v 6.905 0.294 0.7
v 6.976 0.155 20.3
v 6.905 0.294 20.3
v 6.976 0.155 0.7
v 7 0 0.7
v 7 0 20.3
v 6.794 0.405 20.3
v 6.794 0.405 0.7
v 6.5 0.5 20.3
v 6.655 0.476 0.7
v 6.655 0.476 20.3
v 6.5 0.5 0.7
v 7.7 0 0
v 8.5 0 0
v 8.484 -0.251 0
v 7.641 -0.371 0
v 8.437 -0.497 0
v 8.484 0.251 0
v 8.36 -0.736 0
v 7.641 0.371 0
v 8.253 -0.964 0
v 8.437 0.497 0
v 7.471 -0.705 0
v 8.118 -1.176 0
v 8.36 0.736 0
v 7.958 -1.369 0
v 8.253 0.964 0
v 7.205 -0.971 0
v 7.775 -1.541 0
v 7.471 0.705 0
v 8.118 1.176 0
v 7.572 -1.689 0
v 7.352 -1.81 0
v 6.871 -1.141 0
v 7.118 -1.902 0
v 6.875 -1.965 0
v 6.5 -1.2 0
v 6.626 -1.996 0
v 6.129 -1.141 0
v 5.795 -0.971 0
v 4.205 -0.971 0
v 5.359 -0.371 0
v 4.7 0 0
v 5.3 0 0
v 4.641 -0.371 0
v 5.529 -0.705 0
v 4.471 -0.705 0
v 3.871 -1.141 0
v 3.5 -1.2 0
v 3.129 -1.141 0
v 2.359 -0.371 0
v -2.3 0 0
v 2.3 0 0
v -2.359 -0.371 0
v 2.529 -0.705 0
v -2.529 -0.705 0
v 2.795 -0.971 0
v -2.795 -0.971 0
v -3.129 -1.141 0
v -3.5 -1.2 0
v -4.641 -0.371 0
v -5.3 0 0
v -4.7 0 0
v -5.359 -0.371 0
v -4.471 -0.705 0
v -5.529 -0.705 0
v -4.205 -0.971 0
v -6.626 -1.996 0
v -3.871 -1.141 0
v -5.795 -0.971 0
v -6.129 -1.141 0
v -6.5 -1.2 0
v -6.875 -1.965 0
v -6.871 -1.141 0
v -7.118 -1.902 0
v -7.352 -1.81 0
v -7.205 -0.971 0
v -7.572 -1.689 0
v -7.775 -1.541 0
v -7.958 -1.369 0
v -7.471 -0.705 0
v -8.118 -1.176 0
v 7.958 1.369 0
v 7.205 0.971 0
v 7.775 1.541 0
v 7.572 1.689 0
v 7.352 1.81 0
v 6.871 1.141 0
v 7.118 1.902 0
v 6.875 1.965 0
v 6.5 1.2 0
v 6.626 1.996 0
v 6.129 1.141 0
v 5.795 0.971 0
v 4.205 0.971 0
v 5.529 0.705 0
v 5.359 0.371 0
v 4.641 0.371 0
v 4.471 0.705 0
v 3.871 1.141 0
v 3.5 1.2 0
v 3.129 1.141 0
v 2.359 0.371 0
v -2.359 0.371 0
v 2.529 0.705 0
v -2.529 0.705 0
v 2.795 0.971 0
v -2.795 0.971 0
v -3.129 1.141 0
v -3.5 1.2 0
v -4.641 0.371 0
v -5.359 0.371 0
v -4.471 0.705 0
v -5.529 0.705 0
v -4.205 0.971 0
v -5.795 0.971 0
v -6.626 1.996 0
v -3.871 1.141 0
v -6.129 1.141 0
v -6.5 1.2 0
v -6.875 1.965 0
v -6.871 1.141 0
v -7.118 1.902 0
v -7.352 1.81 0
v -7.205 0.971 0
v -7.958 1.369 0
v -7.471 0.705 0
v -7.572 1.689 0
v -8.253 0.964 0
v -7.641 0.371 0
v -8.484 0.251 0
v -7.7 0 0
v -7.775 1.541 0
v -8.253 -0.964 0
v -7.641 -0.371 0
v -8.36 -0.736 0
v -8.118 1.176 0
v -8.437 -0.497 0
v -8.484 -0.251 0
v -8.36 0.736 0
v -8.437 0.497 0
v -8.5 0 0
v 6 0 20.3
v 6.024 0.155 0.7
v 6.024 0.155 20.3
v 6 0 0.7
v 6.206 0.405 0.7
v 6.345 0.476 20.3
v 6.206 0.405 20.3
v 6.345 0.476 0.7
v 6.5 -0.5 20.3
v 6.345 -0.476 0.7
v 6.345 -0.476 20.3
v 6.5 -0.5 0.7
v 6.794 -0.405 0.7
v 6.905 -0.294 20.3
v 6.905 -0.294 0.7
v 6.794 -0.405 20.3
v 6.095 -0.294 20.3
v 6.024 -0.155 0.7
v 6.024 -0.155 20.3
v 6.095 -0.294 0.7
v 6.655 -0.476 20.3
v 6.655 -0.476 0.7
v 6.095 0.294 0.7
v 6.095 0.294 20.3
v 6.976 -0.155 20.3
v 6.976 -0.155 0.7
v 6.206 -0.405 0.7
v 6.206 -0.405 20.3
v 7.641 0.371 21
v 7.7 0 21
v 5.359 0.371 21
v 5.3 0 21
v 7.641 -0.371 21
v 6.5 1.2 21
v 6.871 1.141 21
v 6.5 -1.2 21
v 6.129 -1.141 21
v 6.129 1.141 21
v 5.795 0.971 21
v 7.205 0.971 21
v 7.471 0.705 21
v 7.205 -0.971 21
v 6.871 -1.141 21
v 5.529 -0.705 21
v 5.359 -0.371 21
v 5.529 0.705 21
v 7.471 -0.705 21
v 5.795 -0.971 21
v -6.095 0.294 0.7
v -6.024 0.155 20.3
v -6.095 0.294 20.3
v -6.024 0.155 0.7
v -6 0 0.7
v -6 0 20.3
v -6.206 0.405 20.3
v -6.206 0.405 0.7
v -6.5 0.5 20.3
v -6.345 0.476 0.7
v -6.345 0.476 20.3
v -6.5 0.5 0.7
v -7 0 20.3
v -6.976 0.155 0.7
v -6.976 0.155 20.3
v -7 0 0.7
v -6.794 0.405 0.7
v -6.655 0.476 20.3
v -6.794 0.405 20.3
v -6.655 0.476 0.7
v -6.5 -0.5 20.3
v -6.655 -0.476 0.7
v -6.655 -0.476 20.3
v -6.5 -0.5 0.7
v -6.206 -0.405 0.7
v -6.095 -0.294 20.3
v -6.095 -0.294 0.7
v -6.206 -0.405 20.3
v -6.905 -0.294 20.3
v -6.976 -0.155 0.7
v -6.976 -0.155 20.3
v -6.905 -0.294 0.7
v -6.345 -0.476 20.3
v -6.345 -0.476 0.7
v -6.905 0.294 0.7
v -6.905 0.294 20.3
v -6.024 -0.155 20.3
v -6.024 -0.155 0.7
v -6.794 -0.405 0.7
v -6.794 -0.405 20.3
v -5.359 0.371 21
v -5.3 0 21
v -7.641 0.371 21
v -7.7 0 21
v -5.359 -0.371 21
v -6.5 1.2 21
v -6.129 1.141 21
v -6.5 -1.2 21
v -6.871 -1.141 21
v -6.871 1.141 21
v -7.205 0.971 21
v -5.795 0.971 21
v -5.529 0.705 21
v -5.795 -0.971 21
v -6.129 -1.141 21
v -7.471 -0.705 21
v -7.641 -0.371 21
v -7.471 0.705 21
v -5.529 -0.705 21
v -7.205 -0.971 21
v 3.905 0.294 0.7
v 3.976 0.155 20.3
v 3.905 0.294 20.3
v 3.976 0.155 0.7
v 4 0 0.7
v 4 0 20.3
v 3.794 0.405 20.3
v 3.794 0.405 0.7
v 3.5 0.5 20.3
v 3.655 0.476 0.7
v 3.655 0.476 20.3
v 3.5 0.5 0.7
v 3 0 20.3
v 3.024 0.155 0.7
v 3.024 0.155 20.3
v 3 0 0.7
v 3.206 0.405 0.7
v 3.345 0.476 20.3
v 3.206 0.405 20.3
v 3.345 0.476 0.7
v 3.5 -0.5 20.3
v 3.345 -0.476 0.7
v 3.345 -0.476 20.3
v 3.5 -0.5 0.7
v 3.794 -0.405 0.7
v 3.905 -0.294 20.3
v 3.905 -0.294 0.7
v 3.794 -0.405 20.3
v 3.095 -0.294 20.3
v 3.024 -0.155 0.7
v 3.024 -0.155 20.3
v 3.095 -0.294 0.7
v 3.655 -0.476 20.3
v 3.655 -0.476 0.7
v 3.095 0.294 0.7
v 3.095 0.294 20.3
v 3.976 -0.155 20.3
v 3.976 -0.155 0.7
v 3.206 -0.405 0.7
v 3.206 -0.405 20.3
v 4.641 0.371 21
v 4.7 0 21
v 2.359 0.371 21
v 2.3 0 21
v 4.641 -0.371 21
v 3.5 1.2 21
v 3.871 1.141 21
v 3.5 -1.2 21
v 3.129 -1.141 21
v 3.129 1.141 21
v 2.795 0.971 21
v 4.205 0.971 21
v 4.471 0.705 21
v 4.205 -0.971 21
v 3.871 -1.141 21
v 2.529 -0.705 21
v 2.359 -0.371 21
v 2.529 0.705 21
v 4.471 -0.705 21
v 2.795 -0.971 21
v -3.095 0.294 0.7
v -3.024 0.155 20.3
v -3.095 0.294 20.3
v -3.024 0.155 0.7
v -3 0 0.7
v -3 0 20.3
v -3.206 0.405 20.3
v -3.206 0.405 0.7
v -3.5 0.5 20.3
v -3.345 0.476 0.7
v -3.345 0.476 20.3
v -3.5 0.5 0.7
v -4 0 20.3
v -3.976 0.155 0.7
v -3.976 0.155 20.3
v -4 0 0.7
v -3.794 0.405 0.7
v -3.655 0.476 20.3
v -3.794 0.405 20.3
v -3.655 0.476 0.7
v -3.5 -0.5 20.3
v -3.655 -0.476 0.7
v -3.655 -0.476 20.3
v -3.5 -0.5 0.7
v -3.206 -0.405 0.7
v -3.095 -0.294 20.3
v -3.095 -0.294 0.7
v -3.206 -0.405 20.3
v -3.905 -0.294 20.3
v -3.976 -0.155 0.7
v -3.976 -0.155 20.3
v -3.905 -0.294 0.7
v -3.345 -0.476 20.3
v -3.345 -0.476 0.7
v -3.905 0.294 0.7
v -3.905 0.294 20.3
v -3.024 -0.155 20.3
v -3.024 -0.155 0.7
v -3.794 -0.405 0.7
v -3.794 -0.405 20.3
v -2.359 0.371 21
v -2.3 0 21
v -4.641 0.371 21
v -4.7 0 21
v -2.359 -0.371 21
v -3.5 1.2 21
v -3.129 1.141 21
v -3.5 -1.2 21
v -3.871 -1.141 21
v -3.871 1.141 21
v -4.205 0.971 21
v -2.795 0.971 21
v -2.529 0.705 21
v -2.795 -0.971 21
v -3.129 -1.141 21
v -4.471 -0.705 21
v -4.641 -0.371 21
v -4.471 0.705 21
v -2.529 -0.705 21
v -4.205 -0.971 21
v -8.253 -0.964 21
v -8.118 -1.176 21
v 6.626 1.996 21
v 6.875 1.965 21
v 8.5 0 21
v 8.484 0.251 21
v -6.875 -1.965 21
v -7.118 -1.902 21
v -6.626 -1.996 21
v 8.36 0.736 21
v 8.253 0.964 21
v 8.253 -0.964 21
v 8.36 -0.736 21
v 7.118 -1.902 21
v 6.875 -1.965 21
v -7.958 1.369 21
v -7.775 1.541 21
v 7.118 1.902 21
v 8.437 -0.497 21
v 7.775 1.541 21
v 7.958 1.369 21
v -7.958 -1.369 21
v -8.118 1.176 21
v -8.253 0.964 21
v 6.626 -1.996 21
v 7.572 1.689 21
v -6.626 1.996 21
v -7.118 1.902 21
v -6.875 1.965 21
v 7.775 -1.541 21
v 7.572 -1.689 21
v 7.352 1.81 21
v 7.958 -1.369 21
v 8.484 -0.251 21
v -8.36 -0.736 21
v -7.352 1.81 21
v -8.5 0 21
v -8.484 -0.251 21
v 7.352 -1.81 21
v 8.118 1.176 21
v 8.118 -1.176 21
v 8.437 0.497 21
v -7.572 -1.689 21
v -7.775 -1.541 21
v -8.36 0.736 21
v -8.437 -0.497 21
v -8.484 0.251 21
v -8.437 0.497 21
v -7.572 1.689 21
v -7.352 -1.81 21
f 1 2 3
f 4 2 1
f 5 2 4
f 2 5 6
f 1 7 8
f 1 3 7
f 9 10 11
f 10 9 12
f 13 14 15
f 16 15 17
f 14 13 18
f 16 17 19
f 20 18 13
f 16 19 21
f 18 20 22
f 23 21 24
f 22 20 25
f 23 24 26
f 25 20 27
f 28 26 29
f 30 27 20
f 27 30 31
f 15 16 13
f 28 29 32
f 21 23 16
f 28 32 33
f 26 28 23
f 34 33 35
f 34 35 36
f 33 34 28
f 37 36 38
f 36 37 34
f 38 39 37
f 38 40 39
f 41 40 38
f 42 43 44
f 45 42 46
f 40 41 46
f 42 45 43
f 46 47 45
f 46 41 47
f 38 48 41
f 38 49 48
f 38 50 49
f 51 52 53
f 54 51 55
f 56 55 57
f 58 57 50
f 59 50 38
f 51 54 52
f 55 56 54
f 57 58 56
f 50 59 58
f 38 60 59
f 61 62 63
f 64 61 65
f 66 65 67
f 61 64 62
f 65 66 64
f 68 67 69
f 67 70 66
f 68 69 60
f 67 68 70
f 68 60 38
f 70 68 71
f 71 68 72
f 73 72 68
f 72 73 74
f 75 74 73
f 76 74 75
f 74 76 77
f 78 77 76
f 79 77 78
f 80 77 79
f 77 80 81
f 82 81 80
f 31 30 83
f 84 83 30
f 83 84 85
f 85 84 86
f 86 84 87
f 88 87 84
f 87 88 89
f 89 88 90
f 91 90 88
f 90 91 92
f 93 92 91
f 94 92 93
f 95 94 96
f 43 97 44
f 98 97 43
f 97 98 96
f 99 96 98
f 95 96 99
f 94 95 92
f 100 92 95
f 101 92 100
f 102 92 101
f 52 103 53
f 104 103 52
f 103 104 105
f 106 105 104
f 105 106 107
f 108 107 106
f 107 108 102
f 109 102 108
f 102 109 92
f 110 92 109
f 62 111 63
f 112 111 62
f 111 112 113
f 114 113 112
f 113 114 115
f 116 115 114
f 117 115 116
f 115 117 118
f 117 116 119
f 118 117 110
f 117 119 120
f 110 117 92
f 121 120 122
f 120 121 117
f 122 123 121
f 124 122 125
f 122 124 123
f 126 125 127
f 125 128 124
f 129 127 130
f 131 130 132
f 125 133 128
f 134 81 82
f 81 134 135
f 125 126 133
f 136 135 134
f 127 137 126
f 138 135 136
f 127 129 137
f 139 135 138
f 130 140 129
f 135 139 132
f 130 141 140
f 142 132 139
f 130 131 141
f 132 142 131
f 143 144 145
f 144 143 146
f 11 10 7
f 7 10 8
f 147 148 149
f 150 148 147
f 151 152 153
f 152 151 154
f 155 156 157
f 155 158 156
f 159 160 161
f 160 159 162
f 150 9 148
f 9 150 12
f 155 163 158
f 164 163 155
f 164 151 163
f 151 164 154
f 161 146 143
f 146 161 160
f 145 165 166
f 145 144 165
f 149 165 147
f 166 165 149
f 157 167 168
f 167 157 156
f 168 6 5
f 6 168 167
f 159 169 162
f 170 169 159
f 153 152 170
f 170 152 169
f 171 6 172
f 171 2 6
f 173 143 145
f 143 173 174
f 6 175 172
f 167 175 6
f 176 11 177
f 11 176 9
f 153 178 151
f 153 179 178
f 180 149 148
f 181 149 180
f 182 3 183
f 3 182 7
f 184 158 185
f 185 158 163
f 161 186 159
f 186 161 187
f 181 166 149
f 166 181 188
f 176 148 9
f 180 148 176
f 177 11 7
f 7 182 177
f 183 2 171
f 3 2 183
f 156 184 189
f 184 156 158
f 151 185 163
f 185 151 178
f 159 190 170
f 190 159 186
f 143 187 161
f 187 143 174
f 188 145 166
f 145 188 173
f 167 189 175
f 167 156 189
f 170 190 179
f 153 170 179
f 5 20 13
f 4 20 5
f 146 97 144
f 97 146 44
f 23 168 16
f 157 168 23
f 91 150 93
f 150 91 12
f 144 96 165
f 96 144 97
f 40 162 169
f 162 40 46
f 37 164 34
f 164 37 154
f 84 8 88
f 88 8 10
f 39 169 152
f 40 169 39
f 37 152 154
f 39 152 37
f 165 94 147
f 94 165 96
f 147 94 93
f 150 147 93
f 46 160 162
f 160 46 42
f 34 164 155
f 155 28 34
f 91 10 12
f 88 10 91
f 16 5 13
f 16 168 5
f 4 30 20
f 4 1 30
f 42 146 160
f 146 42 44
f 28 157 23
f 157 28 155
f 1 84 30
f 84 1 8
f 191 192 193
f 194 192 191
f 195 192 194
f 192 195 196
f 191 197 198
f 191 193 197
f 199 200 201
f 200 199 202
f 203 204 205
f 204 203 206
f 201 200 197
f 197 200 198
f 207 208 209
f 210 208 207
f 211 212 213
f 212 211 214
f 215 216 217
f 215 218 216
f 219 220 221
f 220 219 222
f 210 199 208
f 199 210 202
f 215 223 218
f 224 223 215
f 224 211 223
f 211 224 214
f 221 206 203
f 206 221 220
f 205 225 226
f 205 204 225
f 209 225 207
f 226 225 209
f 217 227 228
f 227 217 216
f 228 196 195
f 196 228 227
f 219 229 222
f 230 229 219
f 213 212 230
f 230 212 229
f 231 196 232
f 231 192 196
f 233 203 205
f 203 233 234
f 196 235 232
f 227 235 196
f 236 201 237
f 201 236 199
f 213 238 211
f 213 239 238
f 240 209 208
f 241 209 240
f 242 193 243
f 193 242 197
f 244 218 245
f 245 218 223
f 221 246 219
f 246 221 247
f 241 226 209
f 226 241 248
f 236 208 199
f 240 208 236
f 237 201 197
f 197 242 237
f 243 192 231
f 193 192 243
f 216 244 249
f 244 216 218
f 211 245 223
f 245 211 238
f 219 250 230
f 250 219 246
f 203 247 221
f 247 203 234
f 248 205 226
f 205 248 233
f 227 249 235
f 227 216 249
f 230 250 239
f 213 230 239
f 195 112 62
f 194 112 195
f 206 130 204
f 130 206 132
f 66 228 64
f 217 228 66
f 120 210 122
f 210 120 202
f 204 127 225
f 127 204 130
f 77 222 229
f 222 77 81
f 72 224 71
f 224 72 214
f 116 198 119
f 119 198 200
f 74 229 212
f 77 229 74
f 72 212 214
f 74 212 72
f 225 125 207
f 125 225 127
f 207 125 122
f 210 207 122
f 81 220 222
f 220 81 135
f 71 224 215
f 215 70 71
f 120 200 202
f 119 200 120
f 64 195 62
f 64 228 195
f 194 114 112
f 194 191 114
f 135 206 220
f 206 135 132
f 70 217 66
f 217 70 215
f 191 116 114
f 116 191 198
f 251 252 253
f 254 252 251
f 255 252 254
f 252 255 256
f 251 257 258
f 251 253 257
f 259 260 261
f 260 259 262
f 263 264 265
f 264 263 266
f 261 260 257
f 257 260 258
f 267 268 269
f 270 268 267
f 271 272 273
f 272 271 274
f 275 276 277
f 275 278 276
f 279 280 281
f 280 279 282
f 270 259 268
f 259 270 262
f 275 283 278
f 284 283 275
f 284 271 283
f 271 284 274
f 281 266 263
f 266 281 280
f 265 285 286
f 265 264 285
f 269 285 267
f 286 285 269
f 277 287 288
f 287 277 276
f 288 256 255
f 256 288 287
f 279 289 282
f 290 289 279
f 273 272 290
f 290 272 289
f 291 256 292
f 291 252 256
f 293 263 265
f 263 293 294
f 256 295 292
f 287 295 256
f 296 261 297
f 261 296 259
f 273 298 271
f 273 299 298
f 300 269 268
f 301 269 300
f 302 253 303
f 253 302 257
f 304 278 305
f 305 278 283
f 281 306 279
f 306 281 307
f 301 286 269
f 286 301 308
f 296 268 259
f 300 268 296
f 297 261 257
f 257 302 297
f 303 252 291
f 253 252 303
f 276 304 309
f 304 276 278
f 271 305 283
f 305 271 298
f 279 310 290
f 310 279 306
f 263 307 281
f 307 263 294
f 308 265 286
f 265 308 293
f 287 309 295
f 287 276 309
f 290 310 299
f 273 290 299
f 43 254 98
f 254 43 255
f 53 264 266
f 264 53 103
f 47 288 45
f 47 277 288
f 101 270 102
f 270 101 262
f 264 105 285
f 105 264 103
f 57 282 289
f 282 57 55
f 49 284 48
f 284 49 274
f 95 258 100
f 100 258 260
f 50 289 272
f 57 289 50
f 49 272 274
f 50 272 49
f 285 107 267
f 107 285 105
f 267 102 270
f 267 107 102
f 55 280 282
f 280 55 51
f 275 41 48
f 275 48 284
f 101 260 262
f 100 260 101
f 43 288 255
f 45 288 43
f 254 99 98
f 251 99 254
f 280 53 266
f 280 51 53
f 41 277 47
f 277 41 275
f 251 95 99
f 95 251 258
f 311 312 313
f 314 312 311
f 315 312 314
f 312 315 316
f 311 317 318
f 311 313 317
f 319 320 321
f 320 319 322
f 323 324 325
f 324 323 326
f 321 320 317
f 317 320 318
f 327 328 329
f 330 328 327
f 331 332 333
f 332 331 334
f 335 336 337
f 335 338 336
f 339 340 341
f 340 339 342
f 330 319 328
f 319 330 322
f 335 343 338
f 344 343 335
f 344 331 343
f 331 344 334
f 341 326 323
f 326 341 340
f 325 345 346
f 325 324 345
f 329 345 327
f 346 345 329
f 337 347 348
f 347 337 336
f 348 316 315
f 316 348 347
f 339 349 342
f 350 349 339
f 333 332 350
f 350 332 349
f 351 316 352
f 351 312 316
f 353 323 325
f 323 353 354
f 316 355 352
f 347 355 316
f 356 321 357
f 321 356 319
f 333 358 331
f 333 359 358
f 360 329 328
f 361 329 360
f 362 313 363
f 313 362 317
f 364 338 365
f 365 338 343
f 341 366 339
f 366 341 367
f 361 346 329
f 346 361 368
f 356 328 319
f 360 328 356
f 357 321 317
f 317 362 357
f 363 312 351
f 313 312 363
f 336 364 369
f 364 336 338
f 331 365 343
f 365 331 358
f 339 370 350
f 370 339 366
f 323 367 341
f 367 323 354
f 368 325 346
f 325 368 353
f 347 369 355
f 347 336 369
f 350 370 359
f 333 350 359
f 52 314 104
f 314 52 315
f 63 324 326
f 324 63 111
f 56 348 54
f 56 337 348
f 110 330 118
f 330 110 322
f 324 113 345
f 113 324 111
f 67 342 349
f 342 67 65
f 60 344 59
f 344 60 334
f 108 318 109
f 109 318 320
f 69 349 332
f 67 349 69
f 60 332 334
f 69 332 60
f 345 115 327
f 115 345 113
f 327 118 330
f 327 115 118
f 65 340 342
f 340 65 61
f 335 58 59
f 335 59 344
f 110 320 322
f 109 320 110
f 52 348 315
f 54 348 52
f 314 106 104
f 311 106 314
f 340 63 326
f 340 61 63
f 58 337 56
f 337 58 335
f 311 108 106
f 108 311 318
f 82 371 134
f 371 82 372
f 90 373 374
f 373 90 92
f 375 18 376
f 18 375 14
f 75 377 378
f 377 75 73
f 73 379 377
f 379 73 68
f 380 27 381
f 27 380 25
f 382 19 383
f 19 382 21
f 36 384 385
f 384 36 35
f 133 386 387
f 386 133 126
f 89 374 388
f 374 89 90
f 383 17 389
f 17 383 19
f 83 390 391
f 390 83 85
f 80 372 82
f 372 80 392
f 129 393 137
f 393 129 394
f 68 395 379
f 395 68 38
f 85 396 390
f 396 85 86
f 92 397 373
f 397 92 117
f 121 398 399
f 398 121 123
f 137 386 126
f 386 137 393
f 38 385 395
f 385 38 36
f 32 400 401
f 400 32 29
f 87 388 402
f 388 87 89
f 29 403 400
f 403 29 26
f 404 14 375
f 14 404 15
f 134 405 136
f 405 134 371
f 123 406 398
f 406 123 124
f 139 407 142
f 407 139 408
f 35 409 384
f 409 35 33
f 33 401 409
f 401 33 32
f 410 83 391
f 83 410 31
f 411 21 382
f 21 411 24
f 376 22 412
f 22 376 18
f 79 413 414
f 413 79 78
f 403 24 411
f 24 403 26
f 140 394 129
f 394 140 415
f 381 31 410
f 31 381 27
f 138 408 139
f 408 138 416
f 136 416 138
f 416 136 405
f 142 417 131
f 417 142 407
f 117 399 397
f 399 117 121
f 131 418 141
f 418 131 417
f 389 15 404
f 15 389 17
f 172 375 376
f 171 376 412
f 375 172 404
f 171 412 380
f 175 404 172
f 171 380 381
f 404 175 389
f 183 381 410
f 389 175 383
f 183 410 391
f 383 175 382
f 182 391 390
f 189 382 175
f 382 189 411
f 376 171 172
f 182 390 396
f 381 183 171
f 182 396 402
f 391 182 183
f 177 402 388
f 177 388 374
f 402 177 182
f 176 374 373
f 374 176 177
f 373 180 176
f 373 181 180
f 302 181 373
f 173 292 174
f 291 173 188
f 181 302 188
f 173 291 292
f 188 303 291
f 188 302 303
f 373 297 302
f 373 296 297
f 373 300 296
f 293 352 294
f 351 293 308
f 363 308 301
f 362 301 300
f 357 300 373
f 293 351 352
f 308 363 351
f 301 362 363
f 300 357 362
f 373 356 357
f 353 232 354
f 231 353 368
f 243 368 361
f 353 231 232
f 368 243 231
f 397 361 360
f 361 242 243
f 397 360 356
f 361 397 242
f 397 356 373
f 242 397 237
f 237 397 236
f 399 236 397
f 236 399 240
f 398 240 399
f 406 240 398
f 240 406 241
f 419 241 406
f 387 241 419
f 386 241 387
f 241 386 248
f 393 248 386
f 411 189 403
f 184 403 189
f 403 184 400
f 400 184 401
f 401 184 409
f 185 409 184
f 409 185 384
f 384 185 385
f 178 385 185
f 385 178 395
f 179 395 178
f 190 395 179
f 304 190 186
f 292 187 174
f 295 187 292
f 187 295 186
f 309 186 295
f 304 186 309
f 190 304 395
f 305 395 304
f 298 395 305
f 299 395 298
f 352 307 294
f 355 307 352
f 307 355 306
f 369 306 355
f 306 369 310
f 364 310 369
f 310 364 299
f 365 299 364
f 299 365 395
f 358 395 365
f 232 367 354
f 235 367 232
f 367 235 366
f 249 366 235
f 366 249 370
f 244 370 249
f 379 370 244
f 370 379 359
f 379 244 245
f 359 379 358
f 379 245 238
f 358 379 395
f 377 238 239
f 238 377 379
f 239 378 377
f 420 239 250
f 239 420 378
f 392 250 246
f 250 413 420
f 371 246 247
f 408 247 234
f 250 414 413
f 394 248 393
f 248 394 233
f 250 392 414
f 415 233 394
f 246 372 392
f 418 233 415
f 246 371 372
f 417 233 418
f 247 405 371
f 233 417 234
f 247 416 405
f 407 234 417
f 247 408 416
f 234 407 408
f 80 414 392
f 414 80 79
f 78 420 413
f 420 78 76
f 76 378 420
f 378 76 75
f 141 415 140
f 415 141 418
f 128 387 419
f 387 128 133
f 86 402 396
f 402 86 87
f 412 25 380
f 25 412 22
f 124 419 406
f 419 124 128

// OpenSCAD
H = 21;
Q = 1.2;
D = 1;
module j() {
    cylinder(h=100, d=D, $fn=20);
    translate([0,0,H-Q]) cylinder(5,0,5,$fn=20);
    cylinder(Q,Q,0,$fn=20);
}

difference() {
  hull() {
    translate([6.5, 0]) cylinder(h=H, d=4, $fn=50);
    translate([-6.5, 0]) cylinder(h=H, d=4, $fn=50);
  }
  translate([6.5, 0]) j();
  translate([-6.5, 0]) j();
  translate([3.5, 0]) j();
  translate([-3.5, 0]) j();

}
